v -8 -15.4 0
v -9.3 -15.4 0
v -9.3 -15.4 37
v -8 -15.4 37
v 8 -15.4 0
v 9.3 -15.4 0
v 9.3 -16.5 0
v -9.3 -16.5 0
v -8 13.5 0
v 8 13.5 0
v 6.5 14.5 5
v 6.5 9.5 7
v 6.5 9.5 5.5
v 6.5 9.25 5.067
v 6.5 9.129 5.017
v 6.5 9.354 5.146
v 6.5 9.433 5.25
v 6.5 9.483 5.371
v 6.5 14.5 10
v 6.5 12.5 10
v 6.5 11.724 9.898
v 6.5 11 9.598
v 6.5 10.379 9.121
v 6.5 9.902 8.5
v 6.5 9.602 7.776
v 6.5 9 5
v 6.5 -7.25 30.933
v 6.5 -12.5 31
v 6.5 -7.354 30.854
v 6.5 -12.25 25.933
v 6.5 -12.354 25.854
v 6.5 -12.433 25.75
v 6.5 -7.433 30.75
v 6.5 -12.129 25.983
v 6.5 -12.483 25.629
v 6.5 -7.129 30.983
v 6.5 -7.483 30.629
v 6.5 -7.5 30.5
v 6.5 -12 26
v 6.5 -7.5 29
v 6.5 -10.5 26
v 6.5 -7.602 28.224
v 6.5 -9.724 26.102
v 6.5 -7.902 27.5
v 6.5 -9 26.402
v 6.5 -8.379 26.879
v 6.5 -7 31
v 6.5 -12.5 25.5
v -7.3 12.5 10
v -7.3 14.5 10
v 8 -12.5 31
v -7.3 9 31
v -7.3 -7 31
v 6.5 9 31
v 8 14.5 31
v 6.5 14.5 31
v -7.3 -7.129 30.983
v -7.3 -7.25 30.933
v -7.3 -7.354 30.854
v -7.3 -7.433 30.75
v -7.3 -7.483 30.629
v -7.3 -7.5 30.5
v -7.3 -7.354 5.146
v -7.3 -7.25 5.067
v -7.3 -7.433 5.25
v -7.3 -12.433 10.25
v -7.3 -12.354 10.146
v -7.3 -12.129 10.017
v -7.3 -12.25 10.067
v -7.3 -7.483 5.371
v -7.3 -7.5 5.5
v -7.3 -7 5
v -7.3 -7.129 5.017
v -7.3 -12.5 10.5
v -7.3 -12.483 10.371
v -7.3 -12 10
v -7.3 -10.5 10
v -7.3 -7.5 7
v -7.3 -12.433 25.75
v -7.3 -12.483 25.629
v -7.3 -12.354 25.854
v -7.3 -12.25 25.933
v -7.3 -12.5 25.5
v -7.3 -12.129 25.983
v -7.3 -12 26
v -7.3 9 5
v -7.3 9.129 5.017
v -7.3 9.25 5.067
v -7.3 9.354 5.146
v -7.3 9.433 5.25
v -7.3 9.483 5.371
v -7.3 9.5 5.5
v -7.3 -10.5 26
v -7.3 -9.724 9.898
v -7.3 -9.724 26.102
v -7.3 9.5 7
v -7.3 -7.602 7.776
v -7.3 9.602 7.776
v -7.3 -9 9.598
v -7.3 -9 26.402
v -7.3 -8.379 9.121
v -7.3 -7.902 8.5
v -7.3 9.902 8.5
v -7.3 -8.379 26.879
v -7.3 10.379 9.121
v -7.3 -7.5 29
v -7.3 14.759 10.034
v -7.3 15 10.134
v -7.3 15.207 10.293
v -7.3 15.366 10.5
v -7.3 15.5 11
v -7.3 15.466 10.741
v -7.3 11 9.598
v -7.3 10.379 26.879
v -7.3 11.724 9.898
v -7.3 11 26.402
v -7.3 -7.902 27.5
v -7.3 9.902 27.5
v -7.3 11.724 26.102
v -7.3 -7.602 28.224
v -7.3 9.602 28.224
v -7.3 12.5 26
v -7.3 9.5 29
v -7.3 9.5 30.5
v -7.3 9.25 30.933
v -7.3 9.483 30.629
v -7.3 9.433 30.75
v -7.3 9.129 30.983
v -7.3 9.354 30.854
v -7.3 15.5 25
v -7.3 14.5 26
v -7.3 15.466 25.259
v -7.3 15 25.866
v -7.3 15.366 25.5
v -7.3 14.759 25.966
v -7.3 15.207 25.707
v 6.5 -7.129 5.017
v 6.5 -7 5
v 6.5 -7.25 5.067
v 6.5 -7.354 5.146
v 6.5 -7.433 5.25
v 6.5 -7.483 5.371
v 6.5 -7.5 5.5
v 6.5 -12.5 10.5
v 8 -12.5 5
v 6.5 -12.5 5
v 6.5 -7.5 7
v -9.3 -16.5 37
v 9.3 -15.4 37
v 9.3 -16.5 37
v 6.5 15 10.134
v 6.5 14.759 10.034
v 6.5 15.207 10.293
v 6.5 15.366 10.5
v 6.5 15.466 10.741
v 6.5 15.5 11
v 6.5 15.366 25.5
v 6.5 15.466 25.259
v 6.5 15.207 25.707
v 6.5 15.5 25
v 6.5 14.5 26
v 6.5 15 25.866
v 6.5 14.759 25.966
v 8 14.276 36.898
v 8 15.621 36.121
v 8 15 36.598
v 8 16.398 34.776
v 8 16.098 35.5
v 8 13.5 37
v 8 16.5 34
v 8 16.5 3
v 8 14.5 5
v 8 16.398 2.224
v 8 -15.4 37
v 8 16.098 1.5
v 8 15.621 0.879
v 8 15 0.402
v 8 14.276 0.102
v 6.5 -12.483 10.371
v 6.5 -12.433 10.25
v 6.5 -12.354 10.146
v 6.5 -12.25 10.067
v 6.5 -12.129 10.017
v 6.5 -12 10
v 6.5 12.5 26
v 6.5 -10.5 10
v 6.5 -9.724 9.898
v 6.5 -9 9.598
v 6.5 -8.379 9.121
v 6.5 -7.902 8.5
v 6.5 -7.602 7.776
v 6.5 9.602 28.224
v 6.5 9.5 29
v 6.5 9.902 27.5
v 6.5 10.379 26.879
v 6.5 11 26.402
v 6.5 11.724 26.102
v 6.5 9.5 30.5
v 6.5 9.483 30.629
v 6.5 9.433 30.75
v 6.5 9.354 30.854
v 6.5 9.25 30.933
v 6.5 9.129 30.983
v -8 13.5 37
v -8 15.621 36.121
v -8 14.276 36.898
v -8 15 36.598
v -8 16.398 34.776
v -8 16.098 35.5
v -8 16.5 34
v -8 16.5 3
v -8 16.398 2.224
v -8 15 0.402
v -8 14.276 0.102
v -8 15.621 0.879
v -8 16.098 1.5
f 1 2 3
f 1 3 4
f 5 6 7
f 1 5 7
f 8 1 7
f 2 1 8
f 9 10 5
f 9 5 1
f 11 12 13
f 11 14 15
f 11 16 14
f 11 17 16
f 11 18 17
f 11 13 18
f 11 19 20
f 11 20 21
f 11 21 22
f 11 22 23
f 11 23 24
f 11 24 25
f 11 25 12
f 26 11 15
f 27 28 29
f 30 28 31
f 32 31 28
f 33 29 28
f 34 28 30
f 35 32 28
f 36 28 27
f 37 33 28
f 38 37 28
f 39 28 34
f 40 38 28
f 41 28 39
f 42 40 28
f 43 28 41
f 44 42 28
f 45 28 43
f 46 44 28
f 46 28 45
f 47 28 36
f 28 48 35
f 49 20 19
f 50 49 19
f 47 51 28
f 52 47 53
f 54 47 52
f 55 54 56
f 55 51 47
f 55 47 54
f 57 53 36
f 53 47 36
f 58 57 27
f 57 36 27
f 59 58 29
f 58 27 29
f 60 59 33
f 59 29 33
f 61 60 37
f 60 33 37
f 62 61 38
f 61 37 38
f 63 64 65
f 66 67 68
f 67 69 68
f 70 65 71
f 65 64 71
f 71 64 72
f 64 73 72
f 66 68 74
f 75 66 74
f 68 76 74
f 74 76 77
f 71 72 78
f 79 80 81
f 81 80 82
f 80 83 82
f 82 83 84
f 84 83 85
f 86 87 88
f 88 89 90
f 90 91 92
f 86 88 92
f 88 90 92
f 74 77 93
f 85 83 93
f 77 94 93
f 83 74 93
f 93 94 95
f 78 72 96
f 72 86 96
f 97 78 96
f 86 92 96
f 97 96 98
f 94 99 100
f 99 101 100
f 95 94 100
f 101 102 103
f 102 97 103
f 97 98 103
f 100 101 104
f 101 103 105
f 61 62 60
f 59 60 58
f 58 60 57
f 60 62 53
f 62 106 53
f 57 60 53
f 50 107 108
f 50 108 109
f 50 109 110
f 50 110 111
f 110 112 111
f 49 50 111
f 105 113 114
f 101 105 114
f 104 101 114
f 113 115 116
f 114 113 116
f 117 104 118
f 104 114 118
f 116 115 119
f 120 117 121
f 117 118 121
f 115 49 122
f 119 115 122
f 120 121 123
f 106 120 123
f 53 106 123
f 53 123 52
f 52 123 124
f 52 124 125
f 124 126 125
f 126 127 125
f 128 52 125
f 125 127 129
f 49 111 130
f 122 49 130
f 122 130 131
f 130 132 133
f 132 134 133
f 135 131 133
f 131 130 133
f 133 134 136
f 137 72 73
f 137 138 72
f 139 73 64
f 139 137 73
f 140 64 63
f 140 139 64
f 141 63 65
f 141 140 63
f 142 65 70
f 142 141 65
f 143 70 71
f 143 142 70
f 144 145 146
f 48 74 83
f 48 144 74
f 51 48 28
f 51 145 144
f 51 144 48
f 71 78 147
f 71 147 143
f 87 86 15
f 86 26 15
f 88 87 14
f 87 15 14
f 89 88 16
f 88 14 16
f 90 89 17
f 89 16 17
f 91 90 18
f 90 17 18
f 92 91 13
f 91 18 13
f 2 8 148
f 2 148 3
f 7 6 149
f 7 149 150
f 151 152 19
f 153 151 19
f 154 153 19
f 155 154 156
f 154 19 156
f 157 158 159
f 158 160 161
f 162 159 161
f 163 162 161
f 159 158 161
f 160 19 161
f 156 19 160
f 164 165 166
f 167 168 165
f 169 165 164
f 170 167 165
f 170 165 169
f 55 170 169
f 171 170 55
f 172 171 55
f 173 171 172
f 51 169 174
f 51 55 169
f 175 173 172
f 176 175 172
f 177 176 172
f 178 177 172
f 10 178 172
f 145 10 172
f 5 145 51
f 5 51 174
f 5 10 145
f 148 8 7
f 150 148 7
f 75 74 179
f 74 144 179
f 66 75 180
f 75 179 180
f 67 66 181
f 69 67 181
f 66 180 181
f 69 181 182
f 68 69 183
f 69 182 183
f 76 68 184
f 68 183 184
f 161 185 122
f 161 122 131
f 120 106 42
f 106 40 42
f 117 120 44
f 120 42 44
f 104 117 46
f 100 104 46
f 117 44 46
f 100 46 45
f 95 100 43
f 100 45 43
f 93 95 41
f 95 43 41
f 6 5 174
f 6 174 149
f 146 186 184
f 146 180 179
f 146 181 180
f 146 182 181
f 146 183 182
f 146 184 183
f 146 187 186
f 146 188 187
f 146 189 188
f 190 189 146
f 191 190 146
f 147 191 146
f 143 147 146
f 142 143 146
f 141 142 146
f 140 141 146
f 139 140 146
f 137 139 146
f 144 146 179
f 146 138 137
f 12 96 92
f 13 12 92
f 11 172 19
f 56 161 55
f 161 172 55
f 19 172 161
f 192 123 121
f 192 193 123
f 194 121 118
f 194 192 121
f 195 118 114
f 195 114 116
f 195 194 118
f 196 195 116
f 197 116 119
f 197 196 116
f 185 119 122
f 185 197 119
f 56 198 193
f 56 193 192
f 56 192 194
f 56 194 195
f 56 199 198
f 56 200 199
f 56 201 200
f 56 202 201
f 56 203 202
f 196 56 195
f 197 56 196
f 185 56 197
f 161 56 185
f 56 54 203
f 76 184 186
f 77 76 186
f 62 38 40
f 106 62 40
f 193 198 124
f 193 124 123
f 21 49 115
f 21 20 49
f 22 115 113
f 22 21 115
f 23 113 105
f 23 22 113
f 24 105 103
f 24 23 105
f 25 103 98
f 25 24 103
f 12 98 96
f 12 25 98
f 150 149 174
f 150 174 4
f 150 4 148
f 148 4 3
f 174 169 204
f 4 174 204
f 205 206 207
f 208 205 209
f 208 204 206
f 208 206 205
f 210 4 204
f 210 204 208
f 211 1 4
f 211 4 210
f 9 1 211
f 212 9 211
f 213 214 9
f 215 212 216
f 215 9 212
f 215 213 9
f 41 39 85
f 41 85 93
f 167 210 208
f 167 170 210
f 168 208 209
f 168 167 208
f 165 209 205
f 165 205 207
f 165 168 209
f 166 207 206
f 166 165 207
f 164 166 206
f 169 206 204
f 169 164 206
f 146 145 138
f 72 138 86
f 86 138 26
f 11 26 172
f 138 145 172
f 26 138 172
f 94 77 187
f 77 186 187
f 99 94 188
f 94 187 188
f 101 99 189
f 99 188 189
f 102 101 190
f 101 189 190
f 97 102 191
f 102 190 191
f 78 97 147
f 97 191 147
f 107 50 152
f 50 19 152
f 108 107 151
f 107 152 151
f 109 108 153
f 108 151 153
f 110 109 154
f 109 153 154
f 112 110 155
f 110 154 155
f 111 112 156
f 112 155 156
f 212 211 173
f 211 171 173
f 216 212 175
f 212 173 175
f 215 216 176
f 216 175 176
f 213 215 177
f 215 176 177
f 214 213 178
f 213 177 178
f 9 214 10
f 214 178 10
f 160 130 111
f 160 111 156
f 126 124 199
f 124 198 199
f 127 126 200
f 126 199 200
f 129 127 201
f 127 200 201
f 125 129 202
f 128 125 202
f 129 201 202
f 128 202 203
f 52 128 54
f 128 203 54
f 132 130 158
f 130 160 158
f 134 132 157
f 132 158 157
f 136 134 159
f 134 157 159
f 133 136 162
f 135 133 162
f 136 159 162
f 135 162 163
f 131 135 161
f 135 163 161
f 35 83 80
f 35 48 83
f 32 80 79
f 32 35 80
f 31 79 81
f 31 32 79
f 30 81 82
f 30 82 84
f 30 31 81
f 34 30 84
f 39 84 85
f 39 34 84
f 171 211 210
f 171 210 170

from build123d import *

# Parameters (mm, degrees)
BOSS_EXTRUDE1_DEPTH = 37
SKETCH2_W           = 26
SKETCH2_H           = 27
CUT_EXTRUDE2_DEPTH  = 15.3
SKETCH3_W           = 5
SKETCH3_H           = 5
BOSS_EXTRUDE2_DEPTH = 13.8
FILLET1_R           = 0.5
FILLET2_R           = 3
SKETCH4_W           = 13.8
SKETCH4_H           = 16
CUT_EXTRUDE3_DEPTH  = 1
FILLET3_R           = 1
FILLET4_R           = 3


with BuildPart() as part:
    # Sketch1 → Boss-Extrude1 (new body)
    with BuildSketch(Plane.XY):
        Polygon((-8, -16.5), (-9.3, -16.5), (-9.3, -15.4), (-8, -15.4), (-8, 16.5), (8, 16.5), (8, -15.4), (9.3, -15.4), (9.3, -16.5), (8, -16.5), align=None)
    extrude(amount=BOSS_EXTRUDE1_DEPTH)

    # Sketch2 → Cut-Extrude2 (cut)
    with BuildSketch(Plane.ZY.offset(-8)):
        with Locations((18, 1)):
            Rectangle(SKETCH2_W, SKETCH2_H)
    extrude(amount=CUT_EXTRUDE2_DEPTH, mode=Mode.SUBTRACT)

    # Sketch3 → Boss-Extrude2 (add)
    with BuildSketch(Plane(origin=(-7.3, 0, 0), x_dir=(0, 0, -1), z_dir=(1, 0, 0))):
        with Locations((-28.5, 12)):
            Rectangle(SKETCH3_W, SKETCH3_H)
        with Locations((-7.5, 12)):
            Rectangle(SKETCH3_W, SKETCH3_H)
        with Locations((-7.5, -10)):
            Rectangle(SKETCH3_W, SKETCH3_H)
        with Locations((-28.5, -10)):
            Rectangle(SKETCH3_W, SKETCH3_H)
    extrude(amount=BOSS_EXTRUDE2_DEPTH)

    # Fillet1
    fillet1_edges = [part.edges().sort_by_distance(p)[0] for p in [
        (-0.4, 9.5, 31),
        (-0.4, 9.5, 5),
        (-0.4, -7.5, 31),
        (-0.4, -12.5, 26),
        (-0.4, -7.5, 5),
        (-0.4, -12.5, 10),
    ]]
    fillet(fillet1_edges, radius=FILLET1_R)

    # Fillet2
    fillet2_edges = [part.edges().sort_by_distance(p)[0] for p in [
        (-0.4, 9.5, 26),
        (-0.4, 9.5, 10),
        (-0.4, -7.5, 26),
        (-0.4, -7.5, 10),
    ]]
    fillet(fillet2_edges, radius=FILLET2_R)

    # Sketch4 → Cut-Extrude3 (cut)
    with BuildSketch(Plane.XZ.offset(-14.5)):
        with Locations((-0.4, 18)):
            Rectangle(SKETCH4_W, SKETCH4_H)
    extrude(amount=-CUT_EXTRUDE3_DEPTH, mode=Mode.SUBTRACT)

    # Fillet3
    fillet3_edges = [part.edges().sort_by_distance(p)[0] for p in [
        (-0.4, 15.5, 10),
        (-0.4, 15.5, 26),
    ]]
    fillet(fillet3_edges, radius=FILLET3_R)

    # Fillet4
    fillet4_edges = [part.edges().sort_by_distance(p)[0] for p in [
        (0, 16.5, 0),
        (0, 16.5, 37),
    ]]
    fillet(fillet4_edges, radius=FILLET4_R)


solid = part.part
